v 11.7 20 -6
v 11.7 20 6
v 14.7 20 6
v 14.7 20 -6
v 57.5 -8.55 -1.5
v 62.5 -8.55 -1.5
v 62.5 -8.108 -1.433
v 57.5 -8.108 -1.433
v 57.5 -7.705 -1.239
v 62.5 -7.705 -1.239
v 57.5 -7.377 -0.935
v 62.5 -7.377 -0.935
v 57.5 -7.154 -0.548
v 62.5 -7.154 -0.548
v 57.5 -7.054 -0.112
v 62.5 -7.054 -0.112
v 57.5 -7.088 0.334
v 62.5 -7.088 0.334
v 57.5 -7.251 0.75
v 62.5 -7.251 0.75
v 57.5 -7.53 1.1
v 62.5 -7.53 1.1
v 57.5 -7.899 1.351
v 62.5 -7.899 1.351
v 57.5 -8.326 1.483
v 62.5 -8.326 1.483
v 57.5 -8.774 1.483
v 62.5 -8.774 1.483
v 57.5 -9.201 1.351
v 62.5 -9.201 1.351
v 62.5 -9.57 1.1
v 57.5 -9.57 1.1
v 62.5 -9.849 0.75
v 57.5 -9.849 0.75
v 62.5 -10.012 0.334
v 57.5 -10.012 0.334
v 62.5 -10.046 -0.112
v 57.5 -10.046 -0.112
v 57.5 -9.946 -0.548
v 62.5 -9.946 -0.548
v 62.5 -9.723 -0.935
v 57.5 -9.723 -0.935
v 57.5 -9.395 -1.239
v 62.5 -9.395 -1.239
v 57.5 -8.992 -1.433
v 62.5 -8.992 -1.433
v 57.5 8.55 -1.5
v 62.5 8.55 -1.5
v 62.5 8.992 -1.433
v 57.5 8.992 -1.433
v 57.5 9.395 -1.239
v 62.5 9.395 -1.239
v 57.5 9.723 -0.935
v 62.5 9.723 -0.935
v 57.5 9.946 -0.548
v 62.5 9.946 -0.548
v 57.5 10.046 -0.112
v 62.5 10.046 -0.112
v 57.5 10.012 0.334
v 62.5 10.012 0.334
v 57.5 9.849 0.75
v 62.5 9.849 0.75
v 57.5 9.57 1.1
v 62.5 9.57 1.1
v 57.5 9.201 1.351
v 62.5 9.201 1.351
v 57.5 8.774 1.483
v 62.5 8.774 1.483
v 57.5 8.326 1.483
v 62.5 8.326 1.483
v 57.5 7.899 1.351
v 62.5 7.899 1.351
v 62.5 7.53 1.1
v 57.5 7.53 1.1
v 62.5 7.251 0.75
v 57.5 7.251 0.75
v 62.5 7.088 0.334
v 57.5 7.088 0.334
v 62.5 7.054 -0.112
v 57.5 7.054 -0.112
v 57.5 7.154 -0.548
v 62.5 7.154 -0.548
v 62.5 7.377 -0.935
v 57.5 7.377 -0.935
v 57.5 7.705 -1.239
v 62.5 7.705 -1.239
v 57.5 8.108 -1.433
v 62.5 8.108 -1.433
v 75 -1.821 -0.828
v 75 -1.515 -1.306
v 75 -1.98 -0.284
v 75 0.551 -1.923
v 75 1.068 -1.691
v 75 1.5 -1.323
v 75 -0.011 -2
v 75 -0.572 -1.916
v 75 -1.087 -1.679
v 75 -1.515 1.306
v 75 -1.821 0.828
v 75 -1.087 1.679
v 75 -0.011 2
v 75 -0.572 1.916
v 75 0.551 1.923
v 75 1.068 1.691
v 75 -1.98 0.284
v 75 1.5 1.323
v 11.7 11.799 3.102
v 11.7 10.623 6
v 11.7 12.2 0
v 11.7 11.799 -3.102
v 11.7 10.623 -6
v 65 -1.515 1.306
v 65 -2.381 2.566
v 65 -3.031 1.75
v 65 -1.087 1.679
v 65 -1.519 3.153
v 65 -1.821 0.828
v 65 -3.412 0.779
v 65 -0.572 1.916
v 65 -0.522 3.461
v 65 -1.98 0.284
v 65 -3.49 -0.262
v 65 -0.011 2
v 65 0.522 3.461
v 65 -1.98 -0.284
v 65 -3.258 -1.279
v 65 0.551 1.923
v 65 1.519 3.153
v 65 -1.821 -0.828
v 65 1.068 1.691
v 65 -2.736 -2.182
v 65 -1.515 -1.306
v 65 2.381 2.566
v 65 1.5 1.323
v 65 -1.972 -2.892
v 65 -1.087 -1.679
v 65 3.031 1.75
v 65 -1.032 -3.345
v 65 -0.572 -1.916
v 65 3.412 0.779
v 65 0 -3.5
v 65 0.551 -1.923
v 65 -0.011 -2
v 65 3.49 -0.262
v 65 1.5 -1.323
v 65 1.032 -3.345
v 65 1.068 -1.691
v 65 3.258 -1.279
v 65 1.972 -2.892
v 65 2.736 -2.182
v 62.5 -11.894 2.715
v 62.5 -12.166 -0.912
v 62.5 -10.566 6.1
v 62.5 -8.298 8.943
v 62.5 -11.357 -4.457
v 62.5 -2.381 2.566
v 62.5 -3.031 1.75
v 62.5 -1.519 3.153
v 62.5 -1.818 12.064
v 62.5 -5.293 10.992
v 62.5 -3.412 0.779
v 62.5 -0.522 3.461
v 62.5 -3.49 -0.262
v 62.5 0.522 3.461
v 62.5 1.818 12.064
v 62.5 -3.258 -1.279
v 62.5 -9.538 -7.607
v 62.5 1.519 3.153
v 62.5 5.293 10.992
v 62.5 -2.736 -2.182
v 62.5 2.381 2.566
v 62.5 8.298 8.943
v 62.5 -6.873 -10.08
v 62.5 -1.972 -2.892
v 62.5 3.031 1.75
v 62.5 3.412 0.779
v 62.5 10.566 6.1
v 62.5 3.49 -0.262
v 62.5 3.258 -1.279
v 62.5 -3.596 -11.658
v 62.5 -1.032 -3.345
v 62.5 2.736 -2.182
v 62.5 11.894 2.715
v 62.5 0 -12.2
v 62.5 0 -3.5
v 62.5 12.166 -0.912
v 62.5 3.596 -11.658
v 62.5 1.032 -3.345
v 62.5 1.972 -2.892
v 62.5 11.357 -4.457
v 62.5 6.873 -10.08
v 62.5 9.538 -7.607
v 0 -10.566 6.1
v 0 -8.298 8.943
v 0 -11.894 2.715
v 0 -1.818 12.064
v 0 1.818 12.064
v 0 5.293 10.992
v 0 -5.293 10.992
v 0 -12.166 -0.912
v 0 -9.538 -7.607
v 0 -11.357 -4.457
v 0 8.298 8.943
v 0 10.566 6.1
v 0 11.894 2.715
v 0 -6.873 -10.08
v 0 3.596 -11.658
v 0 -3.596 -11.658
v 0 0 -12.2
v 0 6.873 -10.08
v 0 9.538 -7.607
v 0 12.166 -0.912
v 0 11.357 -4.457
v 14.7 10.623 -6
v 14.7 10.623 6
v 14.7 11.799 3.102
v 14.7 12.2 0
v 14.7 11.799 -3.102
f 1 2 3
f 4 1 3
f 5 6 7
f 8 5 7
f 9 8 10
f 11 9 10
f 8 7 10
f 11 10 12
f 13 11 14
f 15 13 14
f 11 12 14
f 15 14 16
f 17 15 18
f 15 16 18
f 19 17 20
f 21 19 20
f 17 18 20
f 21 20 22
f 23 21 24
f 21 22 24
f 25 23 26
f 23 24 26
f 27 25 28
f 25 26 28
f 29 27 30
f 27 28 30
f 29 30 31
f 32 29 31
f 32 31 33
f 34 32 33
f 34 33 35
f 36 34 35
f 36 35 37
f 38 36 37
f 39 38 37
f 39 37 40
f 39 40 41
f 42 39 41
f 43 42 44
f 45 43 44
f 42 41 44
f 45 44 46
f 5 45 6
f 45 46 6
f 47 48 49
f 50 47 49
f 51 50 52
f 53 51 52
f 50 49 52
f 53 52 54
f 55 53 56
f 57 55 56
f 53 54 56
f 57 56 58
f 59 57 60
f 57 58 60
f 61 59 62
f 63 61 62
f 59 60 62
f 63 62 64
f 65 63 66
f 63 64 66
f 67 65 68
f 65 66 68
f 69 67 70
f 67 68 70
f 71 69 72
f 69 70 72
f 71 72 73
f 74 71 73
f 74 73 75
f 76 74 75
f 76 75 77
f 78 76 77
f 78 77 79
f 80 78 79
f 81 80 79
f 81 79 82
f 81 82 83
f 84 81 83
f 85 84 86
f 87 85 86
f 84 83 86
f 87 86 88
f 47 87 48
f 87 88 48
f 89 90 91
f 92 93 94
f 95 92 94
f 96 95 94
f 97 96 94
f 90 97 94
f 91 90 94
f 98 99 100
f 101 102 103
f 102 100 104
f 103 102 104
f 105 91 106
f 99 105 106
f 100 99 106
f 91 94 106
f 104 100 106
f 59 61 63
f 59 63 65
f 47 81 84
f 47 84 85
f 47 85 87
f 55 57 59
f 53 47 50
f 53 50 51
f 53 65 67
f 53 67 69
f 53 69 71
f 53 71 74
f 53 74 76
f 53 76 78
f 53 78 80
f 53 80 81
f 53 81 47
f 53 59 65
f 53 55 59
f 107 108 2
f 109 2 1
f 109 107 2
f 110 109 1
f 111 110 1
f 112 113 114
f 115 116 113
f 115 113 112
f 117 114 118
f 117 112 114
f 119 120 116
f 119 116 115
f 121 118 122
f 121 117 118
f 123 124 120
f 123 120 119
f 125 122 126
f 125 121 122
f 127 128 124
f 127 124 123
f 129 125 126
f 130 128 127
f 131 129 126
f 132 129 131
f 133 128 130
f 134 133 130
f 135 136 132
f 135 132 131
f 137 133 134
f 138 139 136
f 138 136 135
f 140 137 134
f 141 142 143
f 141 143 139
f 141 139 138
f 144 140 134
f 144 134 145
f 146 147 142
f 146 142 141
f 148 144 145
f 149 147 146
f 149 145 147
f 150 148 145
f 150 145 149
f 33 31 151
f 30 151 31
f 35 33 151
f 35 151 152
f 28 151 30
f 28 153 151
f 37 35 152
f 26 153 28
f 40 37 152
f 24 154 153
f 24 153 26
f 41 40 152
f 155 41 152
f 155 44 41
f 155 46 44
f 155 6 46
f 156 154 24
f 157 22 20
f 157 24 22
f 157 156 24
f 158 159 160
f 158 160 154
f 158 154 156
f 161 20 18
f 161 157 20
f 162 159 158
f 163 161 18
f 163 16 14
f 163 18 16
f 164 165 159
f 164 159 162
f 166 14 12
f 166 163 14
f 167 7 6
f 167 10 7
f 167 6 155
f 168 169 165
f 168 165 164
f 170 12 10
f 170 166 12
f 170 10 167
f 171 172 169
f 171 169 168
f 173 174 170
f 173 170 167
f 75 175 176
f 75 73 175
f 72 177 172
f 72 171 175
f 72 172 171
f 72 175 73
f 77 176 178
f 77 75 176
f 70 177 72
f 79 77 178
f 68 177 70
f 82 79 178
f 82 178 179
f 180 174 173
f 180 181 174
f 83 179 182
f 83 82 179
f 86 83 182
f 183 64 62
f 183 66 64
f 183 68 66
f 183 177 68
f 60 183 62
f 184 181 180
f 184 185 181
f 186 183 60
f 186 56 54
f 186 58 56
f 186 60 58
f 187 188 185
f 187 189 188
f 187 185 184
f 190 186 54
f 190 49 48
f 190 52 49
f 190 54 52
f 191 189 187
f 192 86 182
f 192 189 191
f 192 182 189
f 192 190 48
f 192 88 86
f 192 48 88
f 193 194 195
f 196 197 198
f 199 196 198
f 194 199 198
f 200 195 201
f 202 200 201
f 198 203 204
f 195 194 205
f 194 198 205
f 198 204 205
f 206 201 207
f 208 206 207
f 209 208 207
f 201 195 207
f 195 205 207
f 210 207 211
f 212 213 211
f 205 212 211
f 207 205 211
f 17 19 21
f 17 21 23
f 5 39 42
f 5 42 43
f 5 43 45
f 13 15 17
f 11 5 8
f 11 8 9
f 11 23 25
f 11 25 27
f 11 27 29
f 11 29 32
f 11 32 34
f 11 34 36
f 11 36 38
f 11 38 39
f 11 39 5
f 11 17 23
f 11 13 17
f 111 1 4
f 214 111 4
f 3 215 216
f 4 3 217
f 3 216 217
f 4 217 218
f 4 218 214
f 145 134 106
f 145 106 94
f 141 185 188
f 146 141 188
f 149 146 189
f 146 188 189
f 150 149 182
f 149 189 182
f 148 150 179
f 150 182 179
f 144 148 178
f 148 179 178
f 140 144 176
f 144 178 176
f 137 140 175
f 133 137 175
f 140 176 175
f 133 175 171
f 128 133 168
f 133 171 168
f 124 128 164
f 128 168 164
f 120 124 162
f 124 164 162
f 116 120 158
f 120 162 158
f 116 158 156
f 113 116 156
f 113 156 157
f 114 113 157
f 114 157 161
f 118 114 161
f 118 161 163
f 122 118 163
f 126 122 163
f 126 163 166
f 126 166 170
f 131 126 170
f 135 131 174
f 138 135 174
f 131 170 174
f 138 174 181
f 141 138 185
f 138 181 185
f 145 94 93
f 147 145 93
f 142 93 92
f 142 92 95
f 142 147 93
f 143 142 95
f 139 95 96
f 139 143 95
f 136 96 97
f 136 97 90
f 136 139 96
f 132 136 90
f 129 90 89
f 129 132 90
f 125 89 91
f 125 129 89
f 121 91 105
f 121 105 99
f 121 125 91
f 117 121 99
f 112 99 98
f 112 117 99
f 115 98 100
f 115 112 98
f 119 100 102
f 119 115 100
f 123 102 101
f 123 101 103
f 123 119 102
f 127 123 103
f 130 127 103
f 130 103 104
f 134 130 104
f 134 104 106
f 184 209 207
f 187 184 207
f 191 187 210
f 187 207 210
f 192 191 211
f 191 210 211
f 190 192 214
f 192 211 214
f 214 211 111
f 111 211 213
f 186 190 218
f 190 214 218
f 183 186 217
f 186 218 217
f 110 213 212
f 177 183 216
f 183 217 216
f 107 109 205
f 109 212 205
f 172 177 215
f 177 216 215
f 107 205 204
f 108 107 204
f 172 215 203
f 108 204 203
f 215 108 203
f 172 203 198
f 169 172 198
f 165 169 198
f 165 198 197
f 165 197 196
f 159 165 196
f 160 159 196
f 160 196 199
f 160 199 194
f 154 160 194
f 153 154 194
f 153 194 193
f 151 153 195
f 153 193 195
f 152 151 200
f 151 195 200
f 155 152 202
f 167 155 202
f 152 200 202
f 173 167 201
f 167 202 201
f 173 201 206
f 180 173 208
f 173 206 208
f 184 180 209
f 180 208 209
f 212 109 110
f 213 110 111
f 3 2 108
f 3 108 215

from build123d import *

# Parameters (mm, degrees)
SKETCH1_R           = 12.2
BOSS_EXTRUDE1_DEPTH = 62.5
SKETCH2_R           = 3.5
BOSS_EXTRUDE2_DEPTH = 2.5
BOSS_EXTRUDE3_DEPTH = 10
SKETCH4_R           = 1.5
CUT_EXTRUDE1_DEPTH  = 5
SKETCH5_W           = 3
SKETCH5_H           = 12
BOSS_EXTRUDE4_DEPTH = 20


with BuildPart() as part:
    # Sketch1 → Boss-Extrude1 (new body)
    with BuildSketch(Plane(origin=(0, 0, 0), x_dir=(0, 0, -1), z_dir=(1, 0, 0))):
        Circle(SKETCH1_R)
    extrude(amount=BOSS_EXTRUDE1_DEPTH)

    # Sketch2 → Boss-Extrude2 (add)
    with BuildSketch(Plane(origin=(62.5, 0, 0), x_dir=(0, 0, -1), z_dir=(1, 0, 0))):
        Circle(SKETCH2_R)
    extrude(amount=BOSS_EXTRUDE2_DEPTH)

    # Sketch3 → Boss-Extrude3 (add)
    with BuildSketch(Plane(origin=(65, 0, 0), x_dir=(0, 0, -1), z_dir=(1, 0, 0))):
        with BuildLine():
            Line((-1.322875656, 1.5), (1.322875656, 1.5))
            ThreePointArc((1.322875656, 1.5), (0, -2), (-1.322875656, 1.5))
        make_face()
    extrude(amount=BOSS_EXTRUDE3_DEPTH)

    # Sketch4 → Cut-Extrude1 (cut)
    with BuildSketch(Plane(origin=(62.5, 0, 0), x_dir=(0, 0, -1), z_dir=(1, 0, 0))):
        with Locations((0, 8.55)):
            Circle(SKETCH4_R)
        with Locations((0, -8.55)):
            Circle(SKETCH4_R)
    extrude(amount=-CUT_EXTRUDE1_DEPTH, mode=Mode.SUBTRACT)

    # Sketch5 → Boss-Extrude4 (add)
    with BuildSketch(Plane(origin=(0, 0, 0), x_dir=(1, 0, 0), z_dir=(0, 1, 0))):
        with Locations((13.2, 0)):
            Rectangle(SKETCH5_W, SKETCH5_H)
    extrude(amount=BOSS_EXTRUDE4_DEPTH)


solid = part.part
